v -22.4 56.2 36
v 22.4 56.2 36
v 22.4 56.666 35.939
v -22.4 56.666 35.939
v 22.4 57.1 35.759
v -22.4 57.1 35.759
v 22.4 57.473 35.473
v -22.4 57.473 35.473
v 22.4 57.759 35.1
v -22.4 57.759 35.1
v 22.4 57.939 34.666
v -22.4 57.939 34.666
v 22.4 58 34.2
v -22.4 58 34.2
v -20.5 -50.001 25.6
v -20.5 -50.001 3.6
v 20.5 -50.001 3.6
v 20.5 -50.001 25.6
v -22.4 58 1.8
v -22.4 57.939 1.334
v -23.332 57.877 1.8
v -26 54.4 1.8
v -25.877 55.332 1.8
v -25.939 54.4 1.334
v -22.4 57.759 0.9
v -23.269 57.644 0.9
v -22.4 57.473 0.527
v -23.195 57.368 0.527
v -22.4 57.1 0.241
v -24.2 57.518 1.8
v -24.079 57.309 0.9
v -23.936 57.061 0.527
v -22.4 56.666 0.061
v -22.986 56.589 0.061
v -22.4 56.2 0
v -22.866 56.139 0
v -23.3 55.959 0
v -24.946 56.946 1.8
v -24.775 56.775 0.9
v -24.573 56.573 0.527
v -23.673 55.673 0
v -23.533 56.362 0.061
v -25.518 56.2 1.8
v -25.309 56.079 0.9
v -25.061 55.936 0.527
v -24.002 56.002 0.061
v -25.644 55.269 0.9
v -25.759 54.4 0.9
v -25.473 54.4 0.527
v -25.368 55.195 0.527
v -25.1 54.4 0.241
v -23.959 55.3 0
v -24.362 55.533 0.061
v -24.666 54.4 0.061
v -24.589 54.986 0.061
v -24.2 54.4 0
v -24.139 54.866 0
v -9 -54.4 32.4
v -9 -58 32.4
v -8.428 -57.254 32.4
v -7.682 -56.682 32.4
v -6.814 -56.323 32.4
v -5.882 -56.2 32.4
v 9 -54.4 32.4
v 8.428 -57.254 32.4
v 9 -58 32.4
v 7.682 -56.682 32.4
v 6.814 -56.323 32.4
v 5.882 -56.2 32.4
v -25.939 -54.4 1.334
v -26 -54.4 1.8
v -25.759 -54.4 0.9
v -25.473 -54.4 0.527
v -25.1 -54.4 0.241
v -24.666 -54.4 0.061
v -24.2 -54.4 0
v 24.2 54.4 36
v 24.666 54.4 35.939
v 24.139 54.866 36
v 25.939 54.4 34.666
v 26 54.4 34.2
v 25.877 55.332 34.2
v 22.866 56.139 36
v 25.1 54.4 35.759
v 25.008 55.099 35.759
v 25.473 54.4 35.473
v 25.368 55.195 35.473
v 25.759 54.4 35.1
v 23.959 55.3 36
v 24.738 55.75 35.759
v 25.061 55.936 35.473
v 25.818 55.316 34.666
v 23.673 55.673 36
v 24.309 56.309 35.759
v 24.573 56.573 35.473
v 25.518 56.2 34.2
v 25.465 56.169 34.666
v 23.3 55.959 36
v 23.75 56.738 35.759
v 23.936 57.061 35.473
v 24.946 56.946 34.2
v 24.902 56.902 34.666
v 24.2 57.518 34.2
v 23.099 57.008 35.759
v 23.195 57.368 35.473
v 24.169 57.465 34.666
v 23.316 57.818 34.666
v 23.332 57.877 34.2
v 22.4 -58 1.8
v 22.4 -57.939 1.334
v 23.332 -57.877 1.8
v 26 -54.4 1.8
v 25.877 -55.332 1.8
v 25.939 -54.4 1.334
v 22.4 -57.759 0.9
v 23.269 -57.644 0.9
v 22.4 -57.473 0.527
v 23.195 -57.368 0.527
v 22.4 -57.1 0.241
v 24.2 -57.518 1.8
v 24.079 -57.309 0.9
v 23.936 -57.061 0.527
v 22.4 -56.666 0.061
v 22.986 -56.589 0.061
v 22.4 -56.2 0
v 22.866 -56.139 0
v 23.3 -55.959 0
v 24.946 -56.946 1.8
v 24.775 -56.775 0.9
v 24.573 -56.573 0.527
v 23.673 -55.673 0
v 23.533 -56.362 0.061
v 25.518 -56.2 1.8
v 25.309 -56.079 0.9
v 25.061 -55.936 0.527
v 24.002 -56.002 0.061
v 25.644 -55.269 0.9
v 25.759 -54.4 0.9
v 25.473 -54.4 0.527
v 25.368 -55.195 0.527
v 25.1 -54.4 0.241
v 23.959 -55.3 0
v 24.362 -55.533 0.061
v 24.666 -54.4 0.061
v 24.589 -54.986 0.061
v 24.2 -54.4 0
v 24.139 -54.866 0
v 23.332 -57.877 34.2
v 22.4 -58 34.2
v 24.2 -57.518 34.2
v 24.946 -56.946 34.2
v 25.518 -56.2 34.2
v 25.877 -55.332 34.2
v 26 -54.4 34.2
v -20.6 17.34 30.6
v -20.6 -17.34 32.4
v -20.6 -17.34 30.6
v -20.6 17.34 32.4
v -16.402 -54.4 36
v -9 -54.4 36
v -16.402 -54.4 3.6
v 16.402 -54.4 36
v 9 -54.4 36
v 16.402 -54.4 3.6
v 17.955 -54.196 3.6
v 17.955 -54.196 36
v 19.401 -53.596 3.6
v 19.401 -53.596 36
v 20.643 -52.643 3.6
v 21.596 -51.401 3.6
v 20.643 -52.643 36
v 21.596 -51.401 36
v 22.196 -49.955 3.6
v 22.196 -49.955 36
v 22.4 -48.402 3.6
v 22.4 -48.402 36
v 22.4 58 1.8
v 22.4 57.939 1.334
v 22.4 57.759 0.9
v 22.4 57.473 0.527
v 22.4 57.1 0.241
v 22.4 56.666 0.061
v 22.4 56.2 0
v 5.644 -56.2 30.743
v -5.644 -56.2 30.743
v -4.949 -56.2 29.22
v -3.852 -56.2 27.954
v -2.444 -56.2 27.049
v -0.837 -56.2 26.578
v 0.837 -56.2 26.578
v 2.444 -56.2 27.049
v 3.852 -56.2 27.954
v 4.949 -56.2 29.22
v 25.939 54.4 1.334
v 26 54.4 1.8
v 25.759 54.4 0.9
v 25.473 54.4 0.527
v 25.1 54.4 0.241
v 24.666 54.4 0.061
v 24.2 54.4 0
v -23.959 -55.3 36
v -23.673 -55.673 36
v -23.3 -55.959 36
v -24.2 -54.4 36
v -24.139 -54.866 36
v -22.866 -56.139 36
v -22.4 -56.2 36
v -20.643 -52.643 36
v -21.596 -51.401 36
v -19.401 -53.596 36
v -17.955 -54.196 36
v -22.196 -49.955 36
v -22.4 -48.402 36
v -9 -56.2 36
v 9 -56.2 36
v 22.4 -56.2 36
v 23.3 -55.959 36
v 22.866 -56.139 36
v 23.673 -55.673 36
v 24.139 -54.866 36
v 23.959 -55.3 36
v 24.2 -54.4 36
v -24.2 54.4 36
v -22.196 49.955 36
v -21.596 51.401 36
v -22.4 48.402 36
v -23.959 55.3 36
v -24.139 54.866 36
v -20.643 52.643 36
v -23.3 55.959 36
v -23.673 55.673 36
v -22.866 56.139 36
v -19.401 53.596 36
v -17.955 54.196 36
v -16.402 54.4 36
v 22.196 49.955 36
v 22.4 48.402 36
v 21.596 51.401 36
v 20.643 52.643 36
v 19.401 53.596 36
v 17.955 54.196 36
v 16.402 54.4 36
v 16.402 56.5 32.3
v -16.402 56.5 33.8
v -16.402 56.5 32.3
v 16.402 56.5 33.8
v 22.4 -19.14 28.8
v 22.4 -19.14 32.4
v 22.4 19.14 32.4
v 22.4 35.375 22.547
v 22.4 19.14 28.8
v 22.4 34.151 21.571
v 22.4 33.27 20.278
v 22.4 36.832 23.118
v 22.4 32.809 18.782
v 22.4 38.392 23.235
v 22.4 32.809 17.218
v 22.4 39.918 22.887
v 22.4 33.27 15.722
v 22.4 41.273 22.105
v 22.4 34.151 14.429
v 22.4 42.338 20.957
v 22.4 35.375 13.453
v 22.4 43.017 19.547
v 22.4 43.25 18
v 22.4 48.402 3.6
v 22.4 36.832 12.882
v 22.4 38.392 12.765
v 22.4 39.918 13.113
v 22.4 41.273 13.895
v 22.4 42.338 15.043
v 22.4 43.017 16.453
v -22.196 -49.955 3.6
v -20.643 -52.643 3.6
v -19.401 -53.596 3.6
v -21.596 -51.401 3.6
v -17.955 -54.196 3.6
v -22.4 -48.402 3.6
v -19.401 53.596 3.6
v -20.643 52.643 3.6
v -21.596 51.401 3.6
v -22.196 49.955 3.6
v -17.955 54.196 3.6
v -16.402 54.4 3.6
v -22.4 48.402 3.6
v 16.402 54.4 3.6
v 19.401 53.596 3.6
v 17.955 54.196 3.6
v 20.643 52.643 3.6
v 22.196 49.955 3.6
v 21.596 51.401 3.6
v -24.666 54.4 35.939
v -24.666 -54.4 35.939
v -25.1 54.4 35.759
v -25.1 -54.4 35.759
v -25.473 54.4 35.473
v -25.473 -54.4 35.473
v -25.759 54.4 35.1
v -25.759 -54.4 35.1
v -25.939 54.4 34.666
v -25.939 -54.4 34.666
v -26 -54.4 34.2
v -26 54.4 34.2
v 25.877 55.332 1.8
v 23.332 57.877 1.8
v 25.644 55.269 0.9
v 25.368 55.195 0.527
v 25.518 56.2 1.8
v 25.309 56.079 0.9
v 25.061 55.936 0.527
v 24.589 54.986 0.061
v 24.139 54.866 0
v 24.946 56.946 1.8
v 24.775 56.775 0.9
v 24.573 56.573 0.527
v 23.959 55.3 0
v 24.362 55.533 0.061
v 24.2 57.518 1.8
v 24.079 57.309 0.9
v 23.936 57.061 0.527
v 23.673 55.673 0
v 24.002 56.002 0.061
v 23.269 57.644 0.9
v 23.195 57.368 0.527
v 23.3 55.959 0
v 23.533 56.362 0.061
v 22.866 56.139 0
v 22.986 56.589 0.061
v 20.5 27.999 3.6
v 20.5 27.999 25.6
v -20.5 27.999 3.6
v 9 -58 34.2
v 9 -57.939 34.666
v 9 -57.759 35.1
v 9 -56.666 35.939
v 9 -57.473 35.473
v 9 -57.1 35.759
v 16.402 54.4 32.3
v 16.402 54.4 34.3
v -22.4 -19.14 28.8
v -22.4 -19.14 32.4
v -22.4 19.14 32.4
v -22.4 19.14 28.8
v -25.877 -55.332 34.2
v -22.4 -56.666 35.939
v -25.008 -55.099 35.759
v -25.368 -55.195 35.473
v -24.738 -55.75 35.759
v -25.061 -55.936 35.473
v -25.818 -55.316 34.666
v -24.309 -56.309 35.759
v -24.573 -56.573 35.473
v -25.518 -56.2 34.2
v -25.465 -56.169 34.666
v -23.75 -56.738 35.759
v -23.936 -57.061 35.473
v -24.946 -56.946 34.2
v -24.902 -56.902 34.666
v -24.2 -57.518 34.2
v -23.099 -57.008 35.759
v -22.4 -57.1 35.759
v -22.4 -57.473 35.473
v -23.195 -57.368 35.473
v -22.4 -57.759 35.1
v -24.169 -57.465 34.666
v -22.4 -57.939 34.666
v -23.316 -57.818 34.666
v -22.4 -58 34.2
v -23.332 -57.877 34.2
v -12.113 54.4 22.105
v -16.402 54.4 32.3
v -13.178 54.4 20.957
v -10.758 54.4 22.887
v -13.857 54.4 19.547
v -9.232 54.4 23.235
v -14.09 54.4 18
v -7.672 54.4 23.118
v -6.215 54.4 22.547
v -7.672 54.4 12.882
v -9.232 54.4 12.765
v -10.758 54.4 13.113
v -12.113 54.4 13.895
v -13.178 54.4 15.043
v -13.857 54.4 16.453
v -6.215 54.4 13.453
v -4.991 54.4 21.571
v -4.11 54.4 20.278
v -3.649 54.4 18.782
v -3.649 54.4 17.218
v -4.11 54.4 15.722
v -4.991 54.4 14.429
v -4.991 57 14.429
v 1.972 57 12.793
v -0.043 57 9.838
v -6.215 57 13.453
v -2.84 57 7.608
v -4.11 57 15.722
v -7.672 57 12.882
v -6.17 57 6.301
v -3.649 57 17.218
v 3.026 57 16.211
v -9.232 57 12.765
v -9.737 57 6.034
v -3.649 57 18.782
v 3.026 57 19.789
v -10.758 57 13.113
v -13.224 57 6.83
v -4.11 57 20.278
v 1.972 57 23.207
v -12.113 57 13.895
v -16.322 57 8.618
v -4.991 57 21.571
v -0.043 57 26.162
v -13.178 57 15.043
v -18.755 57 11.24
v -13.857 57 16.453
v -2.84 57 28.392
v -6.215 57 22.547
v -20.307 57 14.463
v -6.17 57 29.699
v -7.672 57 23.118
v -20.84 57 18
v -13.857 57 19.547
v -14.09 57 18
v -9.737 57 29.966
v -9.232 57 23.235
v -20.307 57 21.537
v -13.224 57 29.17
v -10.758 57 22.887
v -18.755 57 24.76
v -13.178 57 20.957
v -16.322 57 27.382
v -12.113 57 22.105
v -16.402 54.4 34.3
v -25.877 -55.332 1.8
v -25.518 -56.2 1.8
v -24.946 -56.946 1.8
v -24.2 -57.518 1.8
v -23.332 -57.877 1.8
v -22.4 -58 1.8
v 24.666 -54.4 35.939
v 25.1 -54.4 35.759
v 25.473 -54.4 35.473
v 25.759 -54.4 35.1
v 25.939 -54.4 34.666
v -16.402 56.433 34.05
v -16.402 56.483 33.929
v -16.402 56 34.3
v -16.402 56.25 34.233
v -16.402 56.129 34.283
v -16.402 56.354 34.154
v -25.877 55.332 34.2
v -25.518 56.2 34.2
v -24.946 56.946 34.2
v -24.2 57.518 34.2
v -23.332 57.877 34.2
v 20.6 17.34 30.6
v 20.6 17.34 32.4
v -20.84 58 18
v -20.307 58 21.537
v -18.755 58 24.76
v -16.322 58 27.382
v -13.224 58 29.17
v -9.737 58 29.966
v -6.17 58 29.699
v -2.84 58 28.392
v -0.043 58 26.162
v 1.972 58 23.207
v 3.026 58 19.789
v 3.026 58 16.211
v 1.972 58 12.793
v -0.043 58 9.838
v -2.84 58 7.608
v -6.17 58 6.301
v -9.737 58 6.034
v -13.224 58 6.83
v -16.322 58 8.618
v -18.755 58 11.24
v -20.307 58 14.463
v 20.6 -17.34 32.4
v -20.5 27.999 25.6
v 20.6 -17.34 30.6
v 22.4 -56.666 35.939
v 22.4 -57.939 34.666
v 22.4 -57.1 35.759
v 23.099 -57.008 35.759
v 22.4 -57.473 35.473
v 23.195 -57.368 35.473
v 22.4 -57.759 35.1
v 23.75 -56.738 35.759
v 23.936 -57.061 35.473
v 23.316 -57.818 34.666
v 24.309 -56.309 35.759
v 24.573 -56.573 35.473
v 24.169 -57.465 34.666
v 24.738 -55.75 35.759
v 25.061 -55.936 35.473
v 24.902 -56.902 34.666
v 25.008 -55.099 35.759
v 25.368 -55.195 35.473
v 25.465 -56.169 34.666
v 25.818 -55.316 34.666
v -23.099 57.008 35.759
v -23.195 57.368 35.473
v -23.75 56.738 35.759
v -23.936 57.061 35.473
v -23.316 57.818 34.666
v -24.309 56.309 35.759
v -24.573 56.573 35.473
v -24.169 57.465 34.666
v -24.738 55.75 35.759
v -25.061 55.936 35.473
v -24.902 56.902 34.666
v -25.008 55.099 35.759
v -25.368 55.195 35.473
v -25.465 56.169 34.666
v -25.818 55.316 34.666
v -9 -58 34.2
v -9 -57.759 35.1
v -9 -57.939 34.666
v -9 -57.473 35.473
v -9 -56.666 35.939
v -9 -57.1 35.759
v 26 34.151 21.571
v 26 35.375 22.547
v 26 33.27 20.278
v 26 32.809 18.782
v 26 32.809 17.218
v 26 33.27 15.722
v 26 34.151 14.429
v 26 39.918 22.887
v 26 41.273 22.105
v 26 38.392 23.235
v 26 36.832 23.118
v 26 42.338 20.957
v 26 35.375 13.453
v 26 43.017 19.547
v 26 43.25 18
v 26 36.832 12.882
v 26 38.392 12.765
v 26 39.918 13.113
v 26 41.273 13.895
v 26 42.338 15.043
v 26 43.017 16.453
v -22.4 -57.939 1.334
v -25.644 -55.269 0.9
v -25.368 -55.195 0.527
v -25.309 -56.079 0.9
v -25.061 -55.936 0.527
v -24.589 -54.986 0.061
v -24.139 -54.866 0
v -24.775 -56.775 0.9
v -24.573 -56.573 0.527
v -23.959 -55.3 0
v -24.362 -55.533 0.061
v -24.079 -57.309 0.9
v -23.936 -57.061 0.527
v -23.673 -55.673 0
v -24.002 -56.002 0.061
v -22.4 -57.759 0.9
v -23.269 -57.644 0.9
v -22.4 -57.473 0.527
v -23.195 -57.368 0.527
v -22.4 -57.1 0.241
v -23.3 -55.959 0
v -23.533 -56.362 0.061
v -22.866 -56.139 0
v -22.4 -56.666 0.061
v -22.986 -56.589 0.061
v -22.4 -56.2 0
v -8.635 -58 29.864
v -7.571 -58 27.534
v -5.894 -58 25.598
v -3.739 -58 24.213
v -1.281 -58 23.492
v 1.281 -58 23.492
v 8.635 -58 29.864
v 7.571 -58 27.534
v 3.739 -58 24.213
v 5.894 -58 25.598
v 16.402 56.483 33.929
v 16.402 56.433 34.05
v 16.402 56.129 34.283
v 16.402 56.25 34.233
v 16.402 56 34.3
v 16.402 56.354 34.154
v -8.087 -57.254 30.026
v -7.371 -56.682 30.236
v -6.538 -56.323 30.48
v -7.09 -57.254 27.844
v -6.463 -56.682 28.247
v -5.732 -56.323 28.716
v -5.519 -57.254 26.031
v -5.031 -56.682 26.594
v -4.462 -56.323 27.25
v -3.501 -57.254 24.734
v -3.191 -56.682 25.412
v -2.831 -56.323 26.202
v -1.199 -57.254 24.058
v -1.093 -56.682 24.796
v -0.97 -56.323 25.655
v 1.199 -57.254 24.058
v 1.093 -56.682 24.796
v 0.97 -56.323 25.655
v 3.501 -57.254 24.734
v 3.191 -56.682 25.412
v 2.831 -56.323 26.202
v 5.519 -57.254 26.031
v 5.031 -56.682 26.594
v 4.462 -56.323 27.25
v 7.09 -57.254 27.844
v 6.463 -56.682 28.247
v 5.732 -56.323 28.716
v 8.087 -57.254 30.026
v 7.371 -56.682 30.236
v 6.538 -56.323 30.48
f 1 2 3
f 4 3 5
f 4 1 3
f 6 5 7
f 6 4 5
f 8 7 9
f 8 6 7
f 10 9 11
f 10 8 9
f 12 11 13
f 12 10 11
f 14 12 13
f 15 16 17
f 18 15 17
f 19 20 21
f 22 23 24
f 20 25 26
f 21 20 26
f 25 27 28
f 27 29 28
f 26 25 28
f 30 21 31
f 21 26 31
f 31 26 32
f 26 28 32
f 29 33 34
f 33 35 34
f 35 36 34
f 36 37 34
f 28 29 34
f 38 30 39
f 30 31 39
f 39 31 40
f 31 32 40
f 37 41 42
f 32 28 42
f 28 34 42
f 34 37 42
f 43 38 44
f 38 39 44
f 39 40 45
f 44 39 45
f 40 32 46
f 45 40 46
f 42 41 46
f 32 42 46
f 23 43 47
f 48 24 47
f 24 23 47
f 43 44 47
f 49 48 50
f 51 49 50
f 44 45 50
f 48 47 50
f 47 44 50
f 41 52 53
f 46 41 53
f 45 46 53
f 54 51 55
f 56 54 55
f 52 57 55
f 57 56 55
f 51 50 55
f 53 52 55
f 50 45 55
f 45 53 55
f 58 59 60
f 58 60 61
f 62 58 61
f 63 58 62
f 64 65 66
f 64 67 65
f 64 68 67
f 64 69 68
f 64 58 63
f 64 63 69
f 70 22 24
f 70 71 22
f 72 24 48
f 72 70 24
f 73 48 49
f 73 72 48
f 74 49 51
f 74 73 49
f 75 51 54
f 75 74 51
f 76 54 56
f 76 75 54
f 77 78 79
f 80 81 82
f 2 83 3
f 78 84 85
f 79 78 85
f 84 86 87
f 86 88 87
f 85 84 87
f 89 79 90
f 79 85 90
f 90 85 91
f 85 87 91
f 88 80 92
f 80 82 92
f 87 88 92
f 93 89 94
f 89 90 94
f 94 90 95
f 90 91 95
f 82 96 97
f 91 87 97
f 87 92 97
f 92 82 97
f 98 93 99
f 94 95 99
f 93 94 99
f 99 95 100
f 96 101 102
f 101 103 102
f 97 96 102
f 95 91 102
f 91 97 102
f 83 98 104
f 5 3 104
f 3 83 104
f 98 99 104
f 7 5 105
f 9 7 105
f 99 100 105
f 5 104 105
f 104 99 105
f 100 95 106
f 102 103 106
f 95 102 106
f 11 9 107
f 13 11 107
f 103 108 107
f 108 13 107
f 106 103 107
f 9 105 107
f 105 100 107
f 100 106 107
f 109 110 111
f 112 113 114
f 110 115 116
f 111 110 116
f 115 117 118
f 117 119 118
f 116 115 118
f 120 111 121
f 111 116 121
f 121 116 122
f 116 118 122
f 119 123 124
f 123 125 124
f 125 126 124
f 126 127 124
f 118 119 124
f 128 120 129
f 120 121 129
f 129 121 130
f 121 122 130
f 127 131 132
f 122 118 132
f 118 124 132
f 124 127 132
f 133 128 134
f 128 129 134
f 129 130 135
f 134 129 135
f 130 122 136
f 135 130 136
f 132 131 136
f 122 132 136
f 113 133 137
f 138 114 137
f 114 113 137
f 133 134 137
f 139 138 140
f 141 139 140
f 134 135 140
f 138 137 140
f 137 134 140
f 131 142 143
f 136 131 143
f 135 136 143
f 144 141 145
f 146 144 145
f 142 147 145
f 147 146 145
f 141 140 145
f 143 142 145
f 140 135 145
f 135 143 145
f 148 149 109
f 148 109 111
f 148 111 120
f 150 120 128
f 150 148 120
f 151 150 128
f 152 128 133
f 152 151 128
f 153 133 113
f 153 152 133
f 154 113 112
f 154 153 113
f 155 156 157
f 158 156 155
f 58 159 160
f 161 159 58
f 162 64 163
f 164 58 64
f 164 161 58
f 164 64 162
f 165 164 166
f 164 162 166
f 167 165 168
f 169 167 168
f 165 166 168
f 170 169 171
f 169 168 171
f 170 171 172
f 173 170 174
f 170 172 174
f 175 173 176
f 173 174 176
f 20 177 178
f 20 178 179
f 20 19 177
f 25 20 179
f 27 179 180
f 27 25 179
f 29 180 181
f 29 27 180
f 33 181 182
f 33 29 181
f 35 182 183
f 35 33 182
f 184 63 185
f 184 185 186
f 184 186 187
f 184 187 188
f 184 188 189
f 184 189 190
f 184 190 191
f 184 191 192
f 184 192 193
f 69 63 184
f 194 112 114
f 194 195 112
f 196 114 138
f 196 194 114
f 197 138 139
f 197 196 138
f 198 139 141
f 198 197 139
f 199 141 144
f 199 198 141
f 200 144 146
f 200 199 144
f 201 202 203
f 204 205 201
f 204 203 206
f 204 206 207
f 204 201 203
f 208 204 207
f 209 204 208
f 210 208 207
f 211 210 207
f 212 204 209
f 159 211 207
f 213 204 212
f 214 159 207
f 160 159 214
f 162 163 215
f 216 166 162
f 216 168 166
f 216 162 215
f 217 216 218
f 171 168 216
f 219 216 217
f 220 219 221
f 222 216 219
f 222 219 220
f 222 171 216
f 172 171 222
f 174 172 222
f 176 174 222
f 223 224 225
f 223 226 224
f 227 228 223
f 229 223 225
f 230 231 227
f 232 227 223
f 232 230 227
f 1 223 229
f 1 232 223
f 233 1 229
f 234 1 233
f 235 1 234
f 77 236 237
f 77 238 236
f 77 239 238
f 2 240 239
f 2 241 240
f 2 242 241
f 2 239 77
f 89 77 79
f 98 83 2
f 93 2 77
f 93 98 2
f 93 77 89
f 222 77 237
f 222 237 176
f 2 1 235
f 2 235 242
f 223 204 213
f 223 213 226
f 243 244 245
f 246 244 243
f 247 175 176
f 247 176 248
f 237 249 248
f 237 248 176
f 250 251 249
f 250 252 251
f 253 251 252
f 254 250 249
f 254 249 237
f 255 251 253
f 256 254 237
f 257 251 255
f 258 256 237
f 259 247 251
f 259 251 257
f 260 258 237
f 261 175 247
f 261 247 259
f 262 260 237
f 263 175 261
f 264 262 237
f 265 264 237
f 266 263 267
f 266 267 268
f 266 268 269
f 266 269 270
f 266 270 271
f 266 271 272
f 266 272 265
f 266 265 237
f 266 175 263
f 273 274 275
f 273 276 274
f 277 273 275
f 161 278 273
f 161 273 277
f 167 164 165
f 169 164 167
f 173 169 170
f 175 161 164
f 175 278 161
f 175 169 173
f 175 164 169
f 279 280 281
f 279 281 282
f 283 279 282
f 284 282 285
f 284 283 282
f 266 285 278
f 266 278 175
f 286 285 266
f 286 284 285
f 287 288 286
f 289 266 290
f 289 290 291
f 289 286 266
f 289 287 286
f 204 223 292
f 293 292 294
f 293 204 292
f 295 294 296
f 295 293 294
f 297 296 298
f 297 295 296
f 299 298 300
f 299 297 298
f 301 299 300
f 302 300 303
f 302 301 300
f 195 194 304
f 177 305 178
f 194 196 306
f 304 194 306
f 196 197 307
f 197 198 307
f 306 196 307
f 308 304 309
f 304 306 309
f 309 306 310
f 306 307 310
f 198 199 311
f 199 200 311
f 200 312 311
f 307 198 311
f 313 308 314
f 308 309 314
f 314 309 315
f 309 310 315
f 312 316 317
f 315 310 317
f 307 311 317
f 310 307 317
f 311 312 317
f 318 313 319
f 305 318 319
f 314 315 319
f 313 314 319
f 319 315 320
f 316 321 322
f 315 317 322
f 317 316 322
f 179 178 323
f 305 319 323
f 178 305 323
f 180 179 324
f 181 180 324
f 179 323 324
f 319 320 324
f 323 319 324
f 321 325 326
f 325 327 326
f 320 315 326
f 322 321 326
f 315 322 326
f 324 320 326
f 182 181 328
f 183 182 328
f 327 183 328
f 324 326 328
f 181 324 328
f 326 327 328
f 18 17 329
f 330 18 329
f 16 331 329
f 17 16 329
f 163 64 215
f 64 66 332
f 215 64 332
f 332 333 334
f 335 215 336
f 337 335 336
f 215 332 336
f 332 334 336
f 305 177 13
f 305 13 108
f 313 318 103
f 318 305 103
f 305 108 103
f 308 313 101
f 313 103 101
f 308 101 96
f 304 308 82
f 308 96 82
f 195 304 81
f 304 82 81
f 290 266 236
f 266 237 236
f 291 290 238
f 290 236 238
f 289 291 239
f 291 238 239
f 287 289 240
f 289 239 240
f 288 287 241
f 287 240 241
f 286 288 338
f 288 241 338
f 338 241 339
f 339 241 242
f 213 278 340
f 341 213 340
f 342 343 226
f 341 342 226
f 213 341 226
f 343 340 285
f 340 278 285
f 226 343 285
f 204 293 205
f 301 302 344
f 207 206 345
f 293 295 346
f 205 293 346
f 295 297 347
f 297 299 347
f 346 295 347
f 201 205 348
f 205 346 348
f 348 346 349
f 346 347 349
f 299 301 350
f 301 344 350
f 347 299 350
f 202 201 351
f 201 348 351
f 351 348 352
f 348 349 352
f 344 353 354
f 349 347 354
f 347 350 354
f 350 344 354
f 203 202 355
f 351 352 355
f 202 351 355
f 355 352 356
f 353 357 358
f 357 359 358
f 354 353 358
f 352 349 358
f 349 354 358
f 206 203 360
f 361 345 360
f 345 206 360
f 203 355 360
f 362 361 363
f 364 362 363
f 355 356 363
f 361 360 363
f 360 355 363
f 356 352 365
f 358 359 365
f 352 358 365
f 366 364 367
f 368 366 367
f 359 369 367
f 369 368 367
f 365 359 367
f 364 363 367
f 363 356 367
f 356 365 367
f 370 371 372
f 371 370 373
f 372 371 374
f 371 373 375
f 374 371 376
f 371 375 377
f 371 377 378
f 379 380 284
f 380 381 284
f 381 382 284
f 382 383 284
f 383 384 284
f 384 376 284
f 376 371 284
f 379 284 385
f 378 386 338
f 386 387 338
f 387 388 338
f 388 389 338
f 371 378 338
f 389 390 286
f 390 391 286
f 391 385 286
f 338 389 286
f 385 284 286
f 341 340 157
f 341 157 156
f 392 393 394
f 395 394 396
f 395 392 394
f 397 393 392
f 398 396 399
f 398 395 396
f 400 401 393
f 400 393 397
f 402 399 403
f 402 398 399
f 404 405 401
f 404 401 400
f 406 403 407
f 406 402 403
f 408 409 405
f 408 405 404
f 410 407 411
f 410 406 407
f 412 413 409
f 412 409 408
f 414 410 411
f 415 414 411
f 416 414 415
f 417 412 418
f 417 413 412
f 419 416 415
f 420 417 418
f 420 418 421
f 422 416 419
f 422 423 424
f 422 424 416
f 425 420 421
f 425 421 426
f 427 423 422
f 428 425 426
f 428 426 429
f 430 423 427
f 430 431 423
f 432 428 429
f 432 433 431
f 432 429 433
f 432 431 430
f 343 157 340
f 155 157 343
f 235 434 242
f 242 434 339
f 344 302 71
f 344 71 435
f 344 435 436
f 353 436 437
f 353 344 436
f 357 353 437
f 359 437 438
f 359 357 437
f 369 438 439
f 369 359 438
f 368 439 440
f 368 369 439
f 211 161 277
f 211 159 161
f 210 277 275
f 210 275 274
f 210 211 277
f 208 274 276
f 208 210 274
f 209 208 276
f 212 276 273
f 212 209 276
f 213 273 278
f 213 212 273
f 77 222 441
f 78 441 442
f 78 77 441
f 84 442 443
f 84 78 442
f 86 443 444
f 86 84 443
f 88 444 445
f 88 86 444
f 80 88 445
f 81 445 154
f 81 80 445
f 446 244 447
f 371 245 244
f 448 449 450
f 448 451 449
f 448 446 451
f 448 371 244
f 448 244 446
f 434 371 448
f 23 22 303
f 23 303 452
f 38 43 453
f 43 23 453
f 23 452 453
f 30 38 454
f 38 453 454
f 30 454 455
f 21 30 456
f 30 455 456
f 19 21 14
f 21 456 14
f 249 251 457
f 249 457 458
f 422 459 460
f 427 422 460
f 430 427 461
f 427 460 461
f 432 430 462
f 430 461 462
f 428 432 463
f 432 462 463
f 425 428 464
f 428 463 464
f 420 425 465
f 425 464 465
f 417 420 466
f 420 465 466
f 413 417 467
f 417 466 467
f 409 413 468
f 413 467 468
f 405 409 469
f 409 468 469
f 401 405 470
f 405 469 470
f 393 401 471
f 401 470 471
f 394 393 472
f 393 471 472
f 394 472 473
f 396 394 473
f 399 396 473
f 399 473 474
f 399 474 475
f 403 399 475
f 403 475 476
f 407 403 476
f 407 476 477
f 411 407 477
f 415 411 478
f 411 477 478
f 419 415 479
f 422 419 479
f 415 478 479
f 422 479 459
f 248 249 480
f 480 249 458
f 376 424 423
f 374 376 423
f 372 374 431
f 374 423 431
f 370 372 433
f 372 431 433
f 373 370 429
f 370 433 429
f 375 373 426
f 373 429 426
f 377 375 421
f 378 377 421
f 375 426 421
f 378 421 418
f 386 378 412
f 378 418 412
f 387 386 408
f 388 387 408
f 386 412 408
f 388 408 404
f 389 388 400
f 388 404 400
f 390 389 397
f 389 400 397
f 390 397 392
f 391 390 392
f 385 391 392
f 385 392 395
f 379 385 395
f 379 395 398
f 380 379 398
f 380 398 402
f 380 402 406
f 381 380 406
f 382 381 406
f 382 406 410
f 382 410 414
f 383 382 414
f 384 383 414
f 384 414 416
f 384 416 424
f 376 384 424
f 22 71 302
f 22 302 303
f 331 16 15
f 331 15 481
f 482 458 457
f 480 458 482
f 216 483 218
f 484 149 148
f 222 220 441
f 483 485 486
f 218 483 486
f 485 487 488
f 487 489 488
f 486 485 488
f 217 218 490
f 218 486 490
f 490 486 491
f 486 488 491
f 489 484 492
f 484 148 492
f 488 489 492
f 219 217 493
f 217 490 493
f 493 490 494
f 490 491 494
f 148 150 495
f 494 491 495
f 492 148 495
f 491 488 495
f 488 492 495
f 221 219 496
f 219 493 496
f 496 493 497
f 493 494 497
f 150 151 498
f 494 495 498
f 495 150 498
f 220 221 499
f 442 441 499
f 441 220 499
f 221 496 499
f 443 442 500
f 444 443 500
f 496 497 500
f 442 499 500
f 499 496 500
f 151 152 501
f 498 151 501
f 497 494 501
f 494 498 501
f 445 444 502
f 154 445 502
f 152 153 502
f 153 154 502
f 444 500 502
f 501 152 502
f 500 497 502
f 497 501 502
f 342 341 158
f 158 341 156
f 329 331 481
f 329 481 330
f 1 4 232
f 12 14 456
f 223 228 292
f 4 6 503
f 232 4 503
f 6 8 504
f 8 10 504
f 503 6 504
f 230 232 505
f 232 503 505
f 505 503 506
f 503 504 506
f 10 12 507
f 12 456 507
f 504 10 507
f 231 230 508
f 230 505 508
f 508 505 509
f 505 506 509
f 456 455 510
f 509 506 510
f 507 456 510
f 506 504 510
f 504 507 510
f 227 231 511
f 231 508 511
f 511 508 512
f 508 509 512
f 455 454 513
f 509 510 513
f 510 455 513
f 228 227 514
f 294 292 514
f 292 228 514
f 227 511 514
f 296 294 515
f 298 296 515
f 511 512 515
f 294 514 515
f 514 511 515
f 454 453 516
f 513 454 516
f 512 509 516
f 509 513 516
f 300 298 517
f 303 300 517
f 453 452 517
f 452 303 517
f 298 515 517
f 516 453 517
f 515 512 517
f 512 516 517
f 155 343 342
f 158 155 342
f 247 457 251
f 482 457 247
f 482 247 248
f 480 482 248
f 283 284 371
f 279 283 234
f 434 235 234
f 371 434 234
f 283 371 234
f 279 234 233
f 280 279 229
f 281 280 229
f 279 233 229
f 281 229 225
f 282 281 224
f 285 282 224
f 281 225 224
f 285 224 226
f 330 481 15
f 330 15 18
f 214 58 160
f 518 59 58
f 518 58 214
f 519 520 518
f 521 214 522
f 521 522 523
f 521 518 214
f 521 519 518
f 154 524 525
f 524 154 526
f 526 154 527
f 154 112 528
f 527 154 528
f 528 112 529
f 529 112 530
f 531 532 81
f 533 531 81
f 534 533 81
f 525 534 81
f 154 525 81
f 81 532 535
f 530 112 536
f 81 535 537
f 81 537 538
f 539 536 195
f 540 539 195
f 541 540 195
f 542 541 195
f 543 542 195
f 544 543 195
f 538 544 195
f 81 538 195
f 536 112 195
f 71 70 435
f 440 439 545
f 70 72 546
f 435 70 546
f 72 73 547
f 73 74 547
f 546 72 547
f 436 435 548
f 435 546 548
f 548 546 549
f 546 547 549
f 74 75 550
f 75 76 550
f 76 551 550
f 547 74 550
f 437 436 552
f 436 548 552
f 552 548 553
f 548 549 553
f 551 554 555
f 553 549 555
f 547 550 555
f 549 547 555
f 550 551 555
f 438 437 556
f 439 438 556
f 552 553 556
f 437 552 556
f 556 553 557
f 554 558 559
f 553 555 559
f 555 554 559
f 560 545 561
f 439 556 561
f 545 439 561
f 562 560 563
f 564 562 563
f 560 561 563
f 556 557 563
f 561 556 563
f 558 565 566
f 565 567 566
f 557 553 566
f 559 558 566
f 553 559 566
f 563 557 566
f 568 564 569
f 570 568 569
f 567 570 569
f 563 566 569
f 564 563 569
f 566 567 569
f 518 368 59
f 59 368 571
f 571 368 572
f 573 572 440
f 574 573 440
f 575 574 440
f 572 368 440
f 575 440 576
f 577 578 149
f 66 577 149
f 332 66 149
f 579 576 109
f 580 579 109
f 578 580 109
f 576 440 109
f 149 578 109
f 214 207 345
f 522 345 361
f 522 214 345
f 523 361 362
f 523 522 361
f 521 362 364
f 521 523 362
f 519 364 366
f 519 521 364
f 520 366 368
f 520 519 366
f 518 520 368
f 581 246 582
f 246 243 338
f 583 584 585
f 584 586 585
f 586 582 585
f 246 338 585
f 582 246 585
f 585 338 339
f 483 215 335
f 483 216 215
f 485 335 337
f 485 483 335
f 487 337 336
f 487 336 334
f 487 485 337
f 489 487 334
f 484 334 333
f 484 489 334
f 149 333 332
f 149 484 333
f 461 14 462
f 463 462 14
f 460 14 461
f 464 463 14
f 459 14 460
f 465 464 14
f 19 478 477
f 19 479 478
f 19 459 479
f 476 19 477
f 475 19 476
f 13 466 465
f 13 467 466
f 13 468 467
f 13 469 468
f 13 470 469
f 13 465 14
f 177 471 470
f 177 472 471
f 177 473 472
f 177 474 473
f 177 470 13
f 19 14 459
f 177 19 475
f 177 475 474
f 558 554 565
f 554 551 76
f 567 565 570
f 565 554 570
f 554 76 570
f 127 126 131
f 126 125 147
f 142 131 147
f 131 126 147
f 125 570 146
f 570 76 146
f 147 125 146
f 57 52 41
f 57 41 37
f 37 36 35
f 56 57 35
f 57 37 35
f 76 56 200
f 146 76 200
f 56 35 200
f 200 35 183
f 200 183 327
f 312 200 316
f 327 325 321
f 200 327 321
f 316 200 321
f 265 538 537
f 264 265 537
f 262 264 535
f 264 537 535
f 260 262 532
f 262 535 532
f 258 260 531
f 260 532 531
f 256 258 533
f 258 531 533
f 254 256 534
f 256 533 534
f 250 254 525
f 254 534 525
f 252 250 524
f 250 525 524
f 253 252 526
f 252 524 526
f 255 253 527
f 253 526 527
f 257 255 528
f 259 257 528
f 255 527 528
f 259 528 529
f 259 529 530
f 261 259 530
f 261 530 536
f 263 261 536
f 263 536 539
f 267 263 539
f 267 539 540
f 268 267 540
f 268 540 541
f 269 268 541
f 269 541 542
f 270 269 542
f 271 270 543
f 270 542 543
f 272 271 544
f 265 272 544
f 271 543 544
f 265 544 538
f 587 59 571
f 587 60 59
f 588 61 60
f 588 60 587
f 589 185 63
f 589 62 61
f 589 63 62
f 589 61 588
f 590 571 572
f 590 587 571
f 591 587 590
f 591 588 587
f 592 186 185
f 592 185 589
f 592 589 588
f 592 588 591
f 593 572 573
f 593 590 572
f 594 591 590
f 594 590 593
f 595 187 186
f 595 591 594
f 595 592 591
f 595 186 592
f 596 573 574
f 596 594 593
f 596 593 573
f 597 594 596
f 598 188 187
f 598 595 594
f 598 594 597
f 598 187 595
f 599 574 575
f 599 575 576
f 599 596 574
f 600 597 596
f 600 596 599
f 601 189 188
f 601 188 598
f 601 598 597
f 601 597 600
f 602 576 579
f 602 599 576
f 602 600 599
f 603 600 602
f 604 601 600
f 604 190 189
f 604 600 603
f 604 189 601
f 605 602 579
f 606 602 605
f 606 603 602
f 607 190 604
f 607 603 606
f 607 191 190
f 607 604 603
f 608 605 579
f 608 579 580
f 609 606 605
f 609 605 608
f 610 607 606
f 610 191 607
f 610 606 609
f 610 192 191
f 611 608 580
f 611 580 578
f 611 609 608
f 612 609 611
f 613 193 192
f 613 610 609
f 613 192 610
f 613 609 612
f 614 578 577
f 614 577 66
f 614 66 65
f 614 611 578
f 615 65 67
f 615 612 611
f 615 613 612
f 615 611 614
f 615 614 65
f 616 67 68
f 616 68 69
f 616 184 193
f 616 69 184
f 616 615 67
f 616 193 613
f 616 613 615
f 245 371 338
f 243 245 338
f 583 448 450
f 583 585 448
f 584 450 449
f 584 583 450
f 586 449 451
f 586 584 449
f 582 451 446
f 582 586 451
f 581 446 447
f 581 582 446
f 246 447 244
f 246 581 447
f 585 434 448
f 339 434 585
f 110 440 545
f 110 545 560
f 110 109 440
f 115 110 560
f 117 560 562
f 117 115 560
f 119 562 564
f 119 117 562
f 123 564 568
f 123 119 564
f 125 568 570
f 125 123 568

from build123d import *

# Parameters (mm, degrees)
F2_W         = 52
F2_H         = 116
F2_W_2       = 44.8
F2_H_2       = 108.8
F3_DEPTH     = 36
F4_DEPTH     = 3.6
F7_R         = 3.6
F8_R         = 5.9976
F6_R         = 5.25
F9_DEPTH     = 3.6
F5_R         = 5.25
F10_DEPTH    = 3.6
F11_W        = 18
F11_H        = 3.6
F12_DEPTH    = 3.6
F13_W        = 32.8048
F13_H        = 2
F14_DEPTH    = 2.1
F15_R        = 1.8
F6_R_2       = 12
F17_DEPTH    = 1
F18_R        = 0.5
F19_W        = 38.28
F19_H        = 3.6
F21_DEPTH    = 1.8
F20_W        = 38.28
F20_H        = 3.6
F22_DEPTH    = 1.8
F23_SIZE     = 1.79999
F25_DEPTH    = 1.8
F26_T2_ANGLE = 180
F27_W        = 41
F27_H        = 78
F28_DEPTH    = 22


# Not quite as in the source:
# - a fillet or chamfer that OpenCascade refuses, or shapes differently, is made with other operations: its cross-section is extruded or revolved along the edge and cut away or added
# - a fillet or chamfer is up to 0.001 mm smaller than in the source, because OpenCascade refuses the exact size
# - a feature of the source that left no trace in its solid (it failed there, or was rolled back) is left out


with BuildPart() as f3:
    # F2 (on Top) → F3 (new body)
    with BuildSketch(Plane.XY):
        Rectangle(F2_W, F2_H)
        Rectangle(F2_W_2, F2_H_2, mode=Mode.SUBTRACT)
    extrude(amount=F3_DEPTH)

    # F2 (on Top) → F4 (join)
    with BuildSketch(Plane.XY):
        Rectangle(F2_W_2, F2_H_2)
    extrude(amount=F4_DEPTH)

    # F7
    f7_edges = [f3.edges().sort_by_distance(p)[0] for p in [
        (26, 58, 18),
        (-26, 58, 18),
        (-26, -58, 18),
        (26, -58, 18),
    ]]
    fillet(f7_edges, radius=F7_R)

    # F8
    f8_edges = [f3.edges().sort_by_distance(p)[0] for p in [
        (-22.4, -54.4, 19.8),
        (22.4, -54.4, 19.8),
        (22.4, 54.4, 19.8),
        (-22.4, 54.4, 19.8),
    ]]
    fillet(f8_edges, radius=F8_R)

    # F6 (on face) → F9 (cut)
    with BuildSketch(Plane(origin=(0, 58, 0), x_dir=(-1, 0, 0), z_dir=(0, 1, 0))):
        with Locations((8.84, 18)):
            Circle(F6_R)
    extrude(amount=-F9_DEPTH, mode=Mode.SUBTRACT)

    # F5 (on face) → F10 (cut)
    with BuildSketch(Plane.YZ.offset(26)):
        with Locations((38, 18)):
            Circle(F5_R)
    extrude(amount=-F10_DEPTH, mode=Mode.SUBTRACT)

    # F11 (on face) → F12 (cut)
    with BuildSketch(Plane.XZ.offset(58)):
        with Locations((0, 34.2)):
            Rectangle(F11_W, F11_H)
    extrude(amount=-F12_DEPTH, mode=Mode.SUBTRACT)

    # F13 (on face) → F14 (cut)
    with BuildSketch(Plane.XZ.offset(-54.4)):
        with Locations((0, 33.3)):
            Rectangle(F13_W, F13_H)
    extrude(amount=-F14_DEPTH, mode=Mode.SUBTRACT)

    # F15
    f15_edges = [f3.edges().sort_by_distance(p)[0] for p in [
        (15.7, -58, 36),
        (24.945584, -56.945584, 36),
        (26, 0, 36),
        (-15.7, -58, 36),
        (-24.945584, -56.945584, 36),
        (-26, 0, 36),
        (-24.945584, 56.945584, 36),
        (0, 58, 36),
        (24.945584, 56.945584, 36),
        (0, -58, 0),
        (-24.945584, -56.945584, 0),
        (-26, 0, 0),
        (-24.945584, 56.945584, 0),
        (0, 58, 0),
        (24.945584, 56.945584, 0),
        (26, 0, 0),
        (24.945584, -56.945584, 0),
    ]]
    fillet(f15_edges, radius=F15_R)

    # F6 (on face) → F17 (cut)
    with BuildSketch(Plane(origin=(0, 58, 0), x_dir=(-1, 0, 0), z_dir=(0, 1, 0))):
        with Locations((8.84, 18)):
            Circle(F6_R_2)
        with Locations((8.84, 18)):
            Circle(F6_R, mode=Mode.SUBTRACT)
    extrude(amount=-F17_DEPTH, mode=Mode.SUBTRACT)

    # F18
    f18_edges = [f3.edges().sort_by_distance(p)[0] for p in [
        (0, 56.5, 34.3),
    ]]
    fillet(f18_edges, radius=F18_R)

    # F19 (on face) → F21 (join)
    with BuildSketch(Plane(origin=(22.4, 0, 0), x_dir=(0, -1, 0), z_dir=(-1, 0, 0))):
        with Locations((0, 30.6)):
            Rectangle(F19_W, F19_H)
    extrude(amount=F21_DEPTH)

    # F20 (on face) → F22 (join)
    with BuildSketch(Plane.YZ.offset(-22.4)):
        with Locations((0, 30.6)):
            Rectangle(F20_W, F20_H)
    extrude(amount=F22_DEPTH)

    # F23 (size 1.8 in the source; OpenCascade refuses exactly that, so slightly less here)
    f23_edges = [f3.edges().sort_by_distance(p)[0] for p in [
        (-20.6, -19.14, 30.6),
        (-20.6, 0, 28.8),
        (-20.6, 19.14, 30.6),
        (20.6, 19.14, 30.6),
        (20.6, 0, 28.8),
        (20.6, -19.14, 30.6),
    ]]
    chamfer(f23_edges, length=F23_SIZE)

    # F11 (on face) → F25 (cut)
    with BuildSketch(Plane.XZ.offset(58)):
        with BuildLine():
            ThreePointArc((-9, 32.4), (0, 23.4), (9, 32.4))
            Line((9, 32.4), (-9, 32.4))
        make_face()
    extrude(amount=-F25_DEPTH, mode=Mode.SUBTRACT)

    # F26: fillet of radius 3.6 on 1 edges, made by hand

    # F26_s1 → F26_t2 (revolve)
    with BuildSketch(Plane.XY.offset(32.4)):
        with BuildLine():
            ThreePointArc((-9, -58), (-7.6823085464, -56.6823085464), (-5.8823085464, -56.2))
            Line((-5.8823085464, -56.2), (-9, -56.2))
            Line((-9, -56.2), (-9, -58))
        make_face()
    revolve(axis=Axis((0, -56.2, 32.4), (0, -1, 0)), revolution_arc=F26_T2_ANGLE)


with BuildPart() as f28:
    # F27 (on face) → F28 (new body)
    with BuildSketch(Plane.XY.offset(3.6)):
        with Locations((0, -11.0006080357)):
            Rectangle(F27_W, F27_H)
    extrude(amount=F28_DEPTH)


solid = Compound([f3.part, f28.part])
